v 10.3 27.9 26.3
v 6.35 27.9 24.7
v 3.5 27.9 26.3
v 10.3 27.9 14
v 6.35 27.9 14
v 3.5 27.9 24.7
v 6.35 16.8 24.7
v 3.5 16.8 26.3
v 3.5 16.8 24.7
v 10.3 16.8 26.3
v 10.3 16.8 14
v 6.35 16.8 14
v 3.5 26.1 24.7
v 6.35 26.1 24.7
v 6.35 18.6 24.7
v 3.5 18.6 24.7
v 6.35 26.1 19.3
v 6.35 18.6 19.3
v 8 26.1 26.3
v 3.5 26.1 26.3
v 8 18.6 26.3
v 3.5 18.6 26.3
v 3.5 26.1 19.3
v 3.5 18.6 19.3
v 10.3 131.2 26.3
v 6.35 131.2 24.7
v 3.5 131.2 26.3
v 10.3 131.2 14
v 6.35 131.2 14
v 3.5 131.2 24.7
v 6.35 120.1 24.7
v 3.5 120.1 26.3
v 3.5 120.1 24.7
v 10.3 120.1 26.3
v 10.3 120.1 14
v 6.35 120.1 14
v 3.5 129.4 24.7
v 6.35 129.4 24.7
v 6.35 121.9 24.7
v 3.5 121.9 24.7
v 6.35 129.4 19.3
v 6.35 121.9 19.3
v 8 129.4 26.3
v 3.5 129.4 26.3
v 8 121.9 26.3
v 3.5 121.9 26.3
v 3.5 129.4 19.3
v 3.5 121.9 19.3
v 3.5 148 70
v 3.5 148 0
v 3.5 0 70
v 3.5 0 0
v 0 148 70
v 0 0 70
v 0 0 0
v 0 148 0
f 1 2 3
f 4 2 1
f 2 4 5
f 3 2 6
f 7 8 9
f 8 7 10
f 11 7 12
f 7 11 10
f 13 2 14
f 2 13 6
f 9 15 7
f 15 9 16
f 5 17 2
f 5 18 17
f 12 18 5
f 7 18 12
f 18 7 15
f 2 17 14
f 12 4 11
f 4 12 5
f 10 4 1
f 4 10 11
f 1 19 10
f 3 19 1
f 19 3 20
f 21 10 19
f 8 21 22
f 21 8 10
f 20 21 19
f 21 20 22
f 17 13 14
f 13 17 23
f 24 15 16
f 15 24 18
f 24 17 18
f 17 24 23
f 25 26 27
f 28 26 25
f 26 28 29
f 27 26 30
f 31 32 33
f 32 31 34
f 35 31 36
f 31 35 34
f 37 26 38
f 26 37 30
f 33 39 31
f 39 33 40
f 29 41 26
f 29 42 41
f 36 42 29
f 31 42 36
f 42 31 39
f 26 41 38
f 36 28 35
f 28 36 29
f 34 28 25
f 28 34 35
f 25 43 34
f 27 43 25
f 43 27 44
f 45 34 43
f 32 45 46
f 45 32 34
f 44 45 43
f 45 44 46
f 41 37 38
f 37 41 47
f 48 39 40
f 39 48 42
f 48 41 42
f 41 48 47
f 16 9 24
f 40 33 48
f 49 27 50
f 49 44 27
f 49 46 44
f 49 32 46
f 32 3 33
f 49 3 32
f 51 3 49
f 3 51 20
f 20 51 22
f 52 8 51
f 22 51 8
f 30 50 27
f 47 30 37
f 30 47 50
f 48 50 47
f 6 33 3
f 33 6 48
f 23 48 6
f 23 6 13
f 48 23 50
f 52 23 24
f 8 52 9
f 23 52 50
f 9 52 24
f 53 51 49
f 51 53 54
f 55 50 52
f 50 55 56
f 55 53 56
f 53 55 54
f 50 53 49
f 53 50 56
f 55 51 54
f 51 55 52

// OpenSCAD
// created by IndiePandaaaaa | Lukas

// fitting for Bosch Professional: 1 609 B07 675

THICKNESS = 3.5;
TOLERANCE = 0.1;
CHAMFER = 1.5;

FULL_WIDTH = 148;  // width of the original support block
FULL_HEIGHT = 88.1;
HEIGHT = 70;
DISTANCE_BETWEEN_HOOKS = 92.2;

function bosch_hook_width() = 11.1;
function bosch_hook_depth() = 6.8;
function bosch_hook_height() = 12.3;

function base_material_thickness() = 2.3;

module bosch_hook() {
    base_material_thickness = base_material_thickness();
    outer_width = bosch_hook_width();
    outer_height = bosch_hook_height();
    outer_depth = bosch_hook_depth();

    top_thickness = 1.6;
    hollow_depth = 2.85;
    hollow_height = 5.3;
    inner_piece_width = 7.5;
    translate([- base_material_thickness, outer_width, 0]) rotate([90, 0, 0]) union() {
        linear_extrude(outer_width) {
            polygon([
                    [0, 0],
                    [base_material_thickness, 0],
                    [base_material_thickness, outer_height - top_thickness],
                    [base_material_thickness + hollow_depth, outer_height - top_thickness],
                    [base_material_thickness + hollow_depth, 0],
                    [base_material_thickness + outer_depth, 0],
                    [base_material_thickness + outer_depth, outer_height],
                    [0, outer_height],
                ]);
        }
        translate([outer_depth, outer_height, outer_width]) rotate([0, 90, 180]) linear_extrude(outer_depth) {
            distance_to_center = (outer_width - inner_piece_width) / 2;
            polygon([
                    [0, 0],
                    [distance_to_center, 0],
                    [distance_to_center, outer_height - hollow_height],
                    [distance_to_center + inner_piece_width, outer_height - hollow_height],
                    [distance_to_center + inner_piece_width, 0],
                ]);
        }
    }
}
translate([THICKNESS, - ((DISTANCE_BETWEEN_HOOKS + bosch_hook_width() * 2) - FULL_WIDTH) / 2, 14]) {
    bosch_hook();
    translate([0, DISTANCE_BETWEEN_HOOKS + bosch_hook_width(), 0]) bosch_hook();
}
cube([THICKNESS, FULL_WIDTH, HEIGHT]);
